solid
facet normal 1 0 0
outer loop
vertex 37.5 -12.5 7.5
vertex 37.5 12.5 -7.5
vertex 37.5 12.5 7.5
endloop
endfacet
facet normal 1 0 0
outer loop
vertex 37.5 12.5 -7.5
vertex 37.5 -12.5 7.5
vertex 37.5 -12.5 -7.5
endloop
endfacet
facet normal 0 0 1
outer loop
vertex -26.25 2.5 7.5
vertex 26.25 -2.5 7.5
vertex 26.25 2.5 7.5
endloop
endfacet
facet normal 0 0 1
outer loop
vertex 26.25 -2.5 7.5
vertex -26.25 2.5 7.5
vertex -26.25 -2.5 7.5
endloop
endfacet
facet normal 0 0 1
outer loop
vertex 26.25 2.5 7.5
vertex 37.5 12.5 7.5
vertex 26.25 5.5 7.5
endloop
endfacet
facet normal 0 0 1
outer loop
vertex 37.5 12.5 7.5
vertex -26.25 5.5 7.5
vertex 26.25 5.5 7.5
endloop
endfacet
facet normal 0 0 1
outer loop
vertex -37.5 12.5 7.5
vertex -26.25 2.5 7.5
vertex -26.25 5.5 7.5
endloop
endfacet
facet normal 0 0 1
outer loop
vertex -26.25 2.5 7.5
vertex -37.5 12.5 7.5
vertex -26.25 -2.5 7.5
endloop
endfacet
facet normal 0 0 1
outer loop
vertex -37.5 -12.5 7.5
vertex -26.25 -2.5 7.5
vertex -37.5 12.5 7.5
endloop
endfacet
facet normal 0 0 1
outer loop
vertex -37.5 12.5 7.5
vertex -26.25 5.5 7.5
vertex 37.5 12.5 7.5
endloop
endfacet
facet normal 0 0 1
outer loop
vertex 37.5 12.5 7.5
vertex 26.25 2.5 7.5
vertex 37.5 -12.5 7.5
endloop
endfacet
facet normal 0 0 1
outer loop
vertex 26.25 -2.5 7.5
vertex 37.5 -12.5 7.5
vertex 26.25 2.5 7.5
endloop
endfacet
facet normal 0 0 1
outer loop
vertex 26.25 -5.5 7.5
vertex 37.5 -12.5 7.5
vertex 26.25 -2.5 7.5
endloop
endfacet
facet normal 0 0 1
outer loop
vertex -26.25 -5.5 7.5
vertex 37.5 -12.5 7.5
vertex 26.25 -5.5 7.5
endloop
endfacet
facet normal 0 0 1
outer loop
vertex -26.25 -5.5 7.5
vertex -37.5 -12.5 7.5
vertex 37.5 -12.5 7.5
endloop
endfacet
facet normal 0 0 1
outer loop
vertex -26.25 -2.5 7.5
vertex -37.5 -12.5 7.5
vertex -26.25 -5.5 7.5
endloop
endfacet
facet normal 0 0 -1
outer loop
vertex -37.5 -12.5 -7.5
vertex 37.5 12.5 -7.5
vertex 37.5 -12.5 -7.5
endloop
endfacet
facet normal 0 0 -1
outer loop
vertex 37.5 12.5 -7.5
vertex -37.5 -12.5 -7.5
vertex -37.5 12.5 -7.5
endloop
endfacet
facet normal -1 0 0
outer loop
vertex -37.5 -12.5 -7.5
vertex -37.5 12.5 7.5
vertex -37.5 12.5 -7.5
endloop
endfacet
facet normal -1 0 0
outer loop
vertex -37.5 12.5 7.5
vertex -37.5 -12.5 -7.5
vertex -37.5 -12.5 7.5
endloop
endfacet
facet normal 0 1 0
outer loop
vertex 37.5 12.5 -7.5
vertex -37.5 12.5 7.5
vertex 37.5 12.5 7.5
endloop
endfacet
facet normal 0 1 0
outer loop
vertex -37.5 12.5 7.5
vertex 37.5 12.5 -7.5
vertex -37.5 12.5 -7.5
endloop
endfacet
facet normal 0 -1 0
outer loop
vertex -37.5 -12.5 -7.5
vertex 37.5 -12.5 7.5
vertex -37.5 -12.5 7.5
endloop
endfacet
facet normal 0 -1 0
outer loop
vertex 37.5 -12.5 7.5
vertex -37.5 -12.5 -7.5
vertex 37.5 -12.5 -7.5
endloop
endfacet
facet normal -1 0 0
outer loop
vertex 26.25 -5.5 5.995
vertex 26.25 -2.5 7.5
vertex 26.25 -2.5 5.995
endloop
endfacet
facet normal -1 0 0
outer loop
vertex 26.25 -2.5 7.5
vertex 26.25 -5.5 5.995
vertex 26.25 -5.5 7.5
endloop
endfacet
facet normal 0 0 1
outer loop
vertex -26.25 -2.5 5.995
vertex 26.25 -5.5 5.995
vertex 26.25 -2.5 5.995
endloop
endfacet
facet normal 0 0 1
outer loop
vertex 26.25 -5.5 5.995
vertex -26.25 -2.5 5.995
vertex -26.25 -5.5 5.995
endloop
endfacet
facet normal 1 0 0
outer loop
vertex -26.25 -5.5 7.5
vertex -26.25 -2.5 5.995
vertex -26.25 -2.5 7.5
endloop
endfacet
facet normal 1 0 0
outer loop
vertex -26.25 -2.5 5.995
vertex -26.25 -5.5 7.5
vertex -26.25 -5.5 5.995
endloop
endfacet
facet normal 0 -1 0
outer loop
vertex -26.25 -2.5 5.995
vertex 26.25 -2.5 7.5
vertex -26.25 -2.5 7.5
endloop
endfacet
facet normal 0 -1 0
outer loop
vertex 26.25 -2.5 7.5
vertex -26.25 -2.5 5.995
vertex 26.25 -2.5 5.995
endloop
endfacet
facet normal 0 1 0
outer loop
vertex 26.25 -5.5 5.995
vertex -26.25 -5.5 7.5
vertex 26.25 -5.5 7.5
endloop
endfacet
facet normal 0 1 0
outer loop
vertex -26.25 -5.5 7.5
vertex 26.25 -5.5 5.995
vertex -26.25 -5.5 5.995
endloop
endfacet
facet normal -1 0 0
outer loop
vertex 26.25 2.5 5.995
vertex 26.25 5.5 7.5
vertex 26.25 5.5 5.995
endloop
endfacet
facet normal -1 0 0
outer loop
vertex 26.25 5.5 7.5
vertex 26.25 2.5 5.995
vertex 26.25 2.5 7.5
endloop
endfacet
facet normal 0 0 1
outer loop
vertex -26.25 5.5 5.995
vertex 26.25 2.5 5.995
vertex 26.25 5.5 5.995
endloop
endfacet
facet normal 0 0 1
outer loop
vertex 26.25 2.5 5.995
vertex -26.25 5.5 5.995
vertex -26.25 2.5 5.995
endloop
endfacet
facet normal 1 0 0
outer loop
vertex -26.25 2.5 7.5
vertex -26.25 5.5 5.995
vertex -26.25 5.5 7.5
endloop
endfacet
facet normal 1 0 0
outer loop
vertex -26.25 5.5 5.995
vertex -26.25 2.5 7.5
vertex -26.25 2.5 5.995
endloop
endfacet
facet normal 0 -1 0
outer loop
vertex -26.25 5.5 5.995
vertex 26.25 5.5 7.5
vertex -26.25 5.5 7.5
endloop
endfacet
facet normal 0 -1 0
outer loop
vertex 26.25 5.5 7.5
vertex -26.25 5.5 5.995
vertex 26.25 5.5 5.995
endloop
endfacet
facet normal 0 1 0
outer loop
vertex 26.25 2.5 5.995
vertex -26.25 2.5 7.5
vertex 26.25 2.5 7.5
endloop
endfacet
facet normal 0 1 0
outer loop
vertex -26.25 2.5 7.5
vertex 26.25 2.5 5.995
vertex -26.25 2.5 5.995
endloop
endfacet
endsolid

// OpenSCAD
// Bloque Jenga — Torre Sabia — MEDIO (2 líneas / ☀)
BLOCK_L = 75; BLOCK_W = 25; BLOCK_H = 15;
MARK_DEPTH = 1.5; MARK_W = 3; MARK_GAP = 4;

module bloque_base() {
  cube([BLOCK_L, BLOCK_W, BLOCK_H], center = true);
}

module marca_linea(offset_y) {
  translate([0, offset_y, BLOCK_H/2 - MARK_DEPTH/2])
    cube([BLOCK_L * 0.7, MARK_W, MARK_DEPTH + 0.01], center = true);
}

module bloque_medio() {
  difference() {
    bloque_base();
    marca_linea(-MARK_GAP);
    marca_linea(MARK_GAP);
  }
}

bloque_medio();
